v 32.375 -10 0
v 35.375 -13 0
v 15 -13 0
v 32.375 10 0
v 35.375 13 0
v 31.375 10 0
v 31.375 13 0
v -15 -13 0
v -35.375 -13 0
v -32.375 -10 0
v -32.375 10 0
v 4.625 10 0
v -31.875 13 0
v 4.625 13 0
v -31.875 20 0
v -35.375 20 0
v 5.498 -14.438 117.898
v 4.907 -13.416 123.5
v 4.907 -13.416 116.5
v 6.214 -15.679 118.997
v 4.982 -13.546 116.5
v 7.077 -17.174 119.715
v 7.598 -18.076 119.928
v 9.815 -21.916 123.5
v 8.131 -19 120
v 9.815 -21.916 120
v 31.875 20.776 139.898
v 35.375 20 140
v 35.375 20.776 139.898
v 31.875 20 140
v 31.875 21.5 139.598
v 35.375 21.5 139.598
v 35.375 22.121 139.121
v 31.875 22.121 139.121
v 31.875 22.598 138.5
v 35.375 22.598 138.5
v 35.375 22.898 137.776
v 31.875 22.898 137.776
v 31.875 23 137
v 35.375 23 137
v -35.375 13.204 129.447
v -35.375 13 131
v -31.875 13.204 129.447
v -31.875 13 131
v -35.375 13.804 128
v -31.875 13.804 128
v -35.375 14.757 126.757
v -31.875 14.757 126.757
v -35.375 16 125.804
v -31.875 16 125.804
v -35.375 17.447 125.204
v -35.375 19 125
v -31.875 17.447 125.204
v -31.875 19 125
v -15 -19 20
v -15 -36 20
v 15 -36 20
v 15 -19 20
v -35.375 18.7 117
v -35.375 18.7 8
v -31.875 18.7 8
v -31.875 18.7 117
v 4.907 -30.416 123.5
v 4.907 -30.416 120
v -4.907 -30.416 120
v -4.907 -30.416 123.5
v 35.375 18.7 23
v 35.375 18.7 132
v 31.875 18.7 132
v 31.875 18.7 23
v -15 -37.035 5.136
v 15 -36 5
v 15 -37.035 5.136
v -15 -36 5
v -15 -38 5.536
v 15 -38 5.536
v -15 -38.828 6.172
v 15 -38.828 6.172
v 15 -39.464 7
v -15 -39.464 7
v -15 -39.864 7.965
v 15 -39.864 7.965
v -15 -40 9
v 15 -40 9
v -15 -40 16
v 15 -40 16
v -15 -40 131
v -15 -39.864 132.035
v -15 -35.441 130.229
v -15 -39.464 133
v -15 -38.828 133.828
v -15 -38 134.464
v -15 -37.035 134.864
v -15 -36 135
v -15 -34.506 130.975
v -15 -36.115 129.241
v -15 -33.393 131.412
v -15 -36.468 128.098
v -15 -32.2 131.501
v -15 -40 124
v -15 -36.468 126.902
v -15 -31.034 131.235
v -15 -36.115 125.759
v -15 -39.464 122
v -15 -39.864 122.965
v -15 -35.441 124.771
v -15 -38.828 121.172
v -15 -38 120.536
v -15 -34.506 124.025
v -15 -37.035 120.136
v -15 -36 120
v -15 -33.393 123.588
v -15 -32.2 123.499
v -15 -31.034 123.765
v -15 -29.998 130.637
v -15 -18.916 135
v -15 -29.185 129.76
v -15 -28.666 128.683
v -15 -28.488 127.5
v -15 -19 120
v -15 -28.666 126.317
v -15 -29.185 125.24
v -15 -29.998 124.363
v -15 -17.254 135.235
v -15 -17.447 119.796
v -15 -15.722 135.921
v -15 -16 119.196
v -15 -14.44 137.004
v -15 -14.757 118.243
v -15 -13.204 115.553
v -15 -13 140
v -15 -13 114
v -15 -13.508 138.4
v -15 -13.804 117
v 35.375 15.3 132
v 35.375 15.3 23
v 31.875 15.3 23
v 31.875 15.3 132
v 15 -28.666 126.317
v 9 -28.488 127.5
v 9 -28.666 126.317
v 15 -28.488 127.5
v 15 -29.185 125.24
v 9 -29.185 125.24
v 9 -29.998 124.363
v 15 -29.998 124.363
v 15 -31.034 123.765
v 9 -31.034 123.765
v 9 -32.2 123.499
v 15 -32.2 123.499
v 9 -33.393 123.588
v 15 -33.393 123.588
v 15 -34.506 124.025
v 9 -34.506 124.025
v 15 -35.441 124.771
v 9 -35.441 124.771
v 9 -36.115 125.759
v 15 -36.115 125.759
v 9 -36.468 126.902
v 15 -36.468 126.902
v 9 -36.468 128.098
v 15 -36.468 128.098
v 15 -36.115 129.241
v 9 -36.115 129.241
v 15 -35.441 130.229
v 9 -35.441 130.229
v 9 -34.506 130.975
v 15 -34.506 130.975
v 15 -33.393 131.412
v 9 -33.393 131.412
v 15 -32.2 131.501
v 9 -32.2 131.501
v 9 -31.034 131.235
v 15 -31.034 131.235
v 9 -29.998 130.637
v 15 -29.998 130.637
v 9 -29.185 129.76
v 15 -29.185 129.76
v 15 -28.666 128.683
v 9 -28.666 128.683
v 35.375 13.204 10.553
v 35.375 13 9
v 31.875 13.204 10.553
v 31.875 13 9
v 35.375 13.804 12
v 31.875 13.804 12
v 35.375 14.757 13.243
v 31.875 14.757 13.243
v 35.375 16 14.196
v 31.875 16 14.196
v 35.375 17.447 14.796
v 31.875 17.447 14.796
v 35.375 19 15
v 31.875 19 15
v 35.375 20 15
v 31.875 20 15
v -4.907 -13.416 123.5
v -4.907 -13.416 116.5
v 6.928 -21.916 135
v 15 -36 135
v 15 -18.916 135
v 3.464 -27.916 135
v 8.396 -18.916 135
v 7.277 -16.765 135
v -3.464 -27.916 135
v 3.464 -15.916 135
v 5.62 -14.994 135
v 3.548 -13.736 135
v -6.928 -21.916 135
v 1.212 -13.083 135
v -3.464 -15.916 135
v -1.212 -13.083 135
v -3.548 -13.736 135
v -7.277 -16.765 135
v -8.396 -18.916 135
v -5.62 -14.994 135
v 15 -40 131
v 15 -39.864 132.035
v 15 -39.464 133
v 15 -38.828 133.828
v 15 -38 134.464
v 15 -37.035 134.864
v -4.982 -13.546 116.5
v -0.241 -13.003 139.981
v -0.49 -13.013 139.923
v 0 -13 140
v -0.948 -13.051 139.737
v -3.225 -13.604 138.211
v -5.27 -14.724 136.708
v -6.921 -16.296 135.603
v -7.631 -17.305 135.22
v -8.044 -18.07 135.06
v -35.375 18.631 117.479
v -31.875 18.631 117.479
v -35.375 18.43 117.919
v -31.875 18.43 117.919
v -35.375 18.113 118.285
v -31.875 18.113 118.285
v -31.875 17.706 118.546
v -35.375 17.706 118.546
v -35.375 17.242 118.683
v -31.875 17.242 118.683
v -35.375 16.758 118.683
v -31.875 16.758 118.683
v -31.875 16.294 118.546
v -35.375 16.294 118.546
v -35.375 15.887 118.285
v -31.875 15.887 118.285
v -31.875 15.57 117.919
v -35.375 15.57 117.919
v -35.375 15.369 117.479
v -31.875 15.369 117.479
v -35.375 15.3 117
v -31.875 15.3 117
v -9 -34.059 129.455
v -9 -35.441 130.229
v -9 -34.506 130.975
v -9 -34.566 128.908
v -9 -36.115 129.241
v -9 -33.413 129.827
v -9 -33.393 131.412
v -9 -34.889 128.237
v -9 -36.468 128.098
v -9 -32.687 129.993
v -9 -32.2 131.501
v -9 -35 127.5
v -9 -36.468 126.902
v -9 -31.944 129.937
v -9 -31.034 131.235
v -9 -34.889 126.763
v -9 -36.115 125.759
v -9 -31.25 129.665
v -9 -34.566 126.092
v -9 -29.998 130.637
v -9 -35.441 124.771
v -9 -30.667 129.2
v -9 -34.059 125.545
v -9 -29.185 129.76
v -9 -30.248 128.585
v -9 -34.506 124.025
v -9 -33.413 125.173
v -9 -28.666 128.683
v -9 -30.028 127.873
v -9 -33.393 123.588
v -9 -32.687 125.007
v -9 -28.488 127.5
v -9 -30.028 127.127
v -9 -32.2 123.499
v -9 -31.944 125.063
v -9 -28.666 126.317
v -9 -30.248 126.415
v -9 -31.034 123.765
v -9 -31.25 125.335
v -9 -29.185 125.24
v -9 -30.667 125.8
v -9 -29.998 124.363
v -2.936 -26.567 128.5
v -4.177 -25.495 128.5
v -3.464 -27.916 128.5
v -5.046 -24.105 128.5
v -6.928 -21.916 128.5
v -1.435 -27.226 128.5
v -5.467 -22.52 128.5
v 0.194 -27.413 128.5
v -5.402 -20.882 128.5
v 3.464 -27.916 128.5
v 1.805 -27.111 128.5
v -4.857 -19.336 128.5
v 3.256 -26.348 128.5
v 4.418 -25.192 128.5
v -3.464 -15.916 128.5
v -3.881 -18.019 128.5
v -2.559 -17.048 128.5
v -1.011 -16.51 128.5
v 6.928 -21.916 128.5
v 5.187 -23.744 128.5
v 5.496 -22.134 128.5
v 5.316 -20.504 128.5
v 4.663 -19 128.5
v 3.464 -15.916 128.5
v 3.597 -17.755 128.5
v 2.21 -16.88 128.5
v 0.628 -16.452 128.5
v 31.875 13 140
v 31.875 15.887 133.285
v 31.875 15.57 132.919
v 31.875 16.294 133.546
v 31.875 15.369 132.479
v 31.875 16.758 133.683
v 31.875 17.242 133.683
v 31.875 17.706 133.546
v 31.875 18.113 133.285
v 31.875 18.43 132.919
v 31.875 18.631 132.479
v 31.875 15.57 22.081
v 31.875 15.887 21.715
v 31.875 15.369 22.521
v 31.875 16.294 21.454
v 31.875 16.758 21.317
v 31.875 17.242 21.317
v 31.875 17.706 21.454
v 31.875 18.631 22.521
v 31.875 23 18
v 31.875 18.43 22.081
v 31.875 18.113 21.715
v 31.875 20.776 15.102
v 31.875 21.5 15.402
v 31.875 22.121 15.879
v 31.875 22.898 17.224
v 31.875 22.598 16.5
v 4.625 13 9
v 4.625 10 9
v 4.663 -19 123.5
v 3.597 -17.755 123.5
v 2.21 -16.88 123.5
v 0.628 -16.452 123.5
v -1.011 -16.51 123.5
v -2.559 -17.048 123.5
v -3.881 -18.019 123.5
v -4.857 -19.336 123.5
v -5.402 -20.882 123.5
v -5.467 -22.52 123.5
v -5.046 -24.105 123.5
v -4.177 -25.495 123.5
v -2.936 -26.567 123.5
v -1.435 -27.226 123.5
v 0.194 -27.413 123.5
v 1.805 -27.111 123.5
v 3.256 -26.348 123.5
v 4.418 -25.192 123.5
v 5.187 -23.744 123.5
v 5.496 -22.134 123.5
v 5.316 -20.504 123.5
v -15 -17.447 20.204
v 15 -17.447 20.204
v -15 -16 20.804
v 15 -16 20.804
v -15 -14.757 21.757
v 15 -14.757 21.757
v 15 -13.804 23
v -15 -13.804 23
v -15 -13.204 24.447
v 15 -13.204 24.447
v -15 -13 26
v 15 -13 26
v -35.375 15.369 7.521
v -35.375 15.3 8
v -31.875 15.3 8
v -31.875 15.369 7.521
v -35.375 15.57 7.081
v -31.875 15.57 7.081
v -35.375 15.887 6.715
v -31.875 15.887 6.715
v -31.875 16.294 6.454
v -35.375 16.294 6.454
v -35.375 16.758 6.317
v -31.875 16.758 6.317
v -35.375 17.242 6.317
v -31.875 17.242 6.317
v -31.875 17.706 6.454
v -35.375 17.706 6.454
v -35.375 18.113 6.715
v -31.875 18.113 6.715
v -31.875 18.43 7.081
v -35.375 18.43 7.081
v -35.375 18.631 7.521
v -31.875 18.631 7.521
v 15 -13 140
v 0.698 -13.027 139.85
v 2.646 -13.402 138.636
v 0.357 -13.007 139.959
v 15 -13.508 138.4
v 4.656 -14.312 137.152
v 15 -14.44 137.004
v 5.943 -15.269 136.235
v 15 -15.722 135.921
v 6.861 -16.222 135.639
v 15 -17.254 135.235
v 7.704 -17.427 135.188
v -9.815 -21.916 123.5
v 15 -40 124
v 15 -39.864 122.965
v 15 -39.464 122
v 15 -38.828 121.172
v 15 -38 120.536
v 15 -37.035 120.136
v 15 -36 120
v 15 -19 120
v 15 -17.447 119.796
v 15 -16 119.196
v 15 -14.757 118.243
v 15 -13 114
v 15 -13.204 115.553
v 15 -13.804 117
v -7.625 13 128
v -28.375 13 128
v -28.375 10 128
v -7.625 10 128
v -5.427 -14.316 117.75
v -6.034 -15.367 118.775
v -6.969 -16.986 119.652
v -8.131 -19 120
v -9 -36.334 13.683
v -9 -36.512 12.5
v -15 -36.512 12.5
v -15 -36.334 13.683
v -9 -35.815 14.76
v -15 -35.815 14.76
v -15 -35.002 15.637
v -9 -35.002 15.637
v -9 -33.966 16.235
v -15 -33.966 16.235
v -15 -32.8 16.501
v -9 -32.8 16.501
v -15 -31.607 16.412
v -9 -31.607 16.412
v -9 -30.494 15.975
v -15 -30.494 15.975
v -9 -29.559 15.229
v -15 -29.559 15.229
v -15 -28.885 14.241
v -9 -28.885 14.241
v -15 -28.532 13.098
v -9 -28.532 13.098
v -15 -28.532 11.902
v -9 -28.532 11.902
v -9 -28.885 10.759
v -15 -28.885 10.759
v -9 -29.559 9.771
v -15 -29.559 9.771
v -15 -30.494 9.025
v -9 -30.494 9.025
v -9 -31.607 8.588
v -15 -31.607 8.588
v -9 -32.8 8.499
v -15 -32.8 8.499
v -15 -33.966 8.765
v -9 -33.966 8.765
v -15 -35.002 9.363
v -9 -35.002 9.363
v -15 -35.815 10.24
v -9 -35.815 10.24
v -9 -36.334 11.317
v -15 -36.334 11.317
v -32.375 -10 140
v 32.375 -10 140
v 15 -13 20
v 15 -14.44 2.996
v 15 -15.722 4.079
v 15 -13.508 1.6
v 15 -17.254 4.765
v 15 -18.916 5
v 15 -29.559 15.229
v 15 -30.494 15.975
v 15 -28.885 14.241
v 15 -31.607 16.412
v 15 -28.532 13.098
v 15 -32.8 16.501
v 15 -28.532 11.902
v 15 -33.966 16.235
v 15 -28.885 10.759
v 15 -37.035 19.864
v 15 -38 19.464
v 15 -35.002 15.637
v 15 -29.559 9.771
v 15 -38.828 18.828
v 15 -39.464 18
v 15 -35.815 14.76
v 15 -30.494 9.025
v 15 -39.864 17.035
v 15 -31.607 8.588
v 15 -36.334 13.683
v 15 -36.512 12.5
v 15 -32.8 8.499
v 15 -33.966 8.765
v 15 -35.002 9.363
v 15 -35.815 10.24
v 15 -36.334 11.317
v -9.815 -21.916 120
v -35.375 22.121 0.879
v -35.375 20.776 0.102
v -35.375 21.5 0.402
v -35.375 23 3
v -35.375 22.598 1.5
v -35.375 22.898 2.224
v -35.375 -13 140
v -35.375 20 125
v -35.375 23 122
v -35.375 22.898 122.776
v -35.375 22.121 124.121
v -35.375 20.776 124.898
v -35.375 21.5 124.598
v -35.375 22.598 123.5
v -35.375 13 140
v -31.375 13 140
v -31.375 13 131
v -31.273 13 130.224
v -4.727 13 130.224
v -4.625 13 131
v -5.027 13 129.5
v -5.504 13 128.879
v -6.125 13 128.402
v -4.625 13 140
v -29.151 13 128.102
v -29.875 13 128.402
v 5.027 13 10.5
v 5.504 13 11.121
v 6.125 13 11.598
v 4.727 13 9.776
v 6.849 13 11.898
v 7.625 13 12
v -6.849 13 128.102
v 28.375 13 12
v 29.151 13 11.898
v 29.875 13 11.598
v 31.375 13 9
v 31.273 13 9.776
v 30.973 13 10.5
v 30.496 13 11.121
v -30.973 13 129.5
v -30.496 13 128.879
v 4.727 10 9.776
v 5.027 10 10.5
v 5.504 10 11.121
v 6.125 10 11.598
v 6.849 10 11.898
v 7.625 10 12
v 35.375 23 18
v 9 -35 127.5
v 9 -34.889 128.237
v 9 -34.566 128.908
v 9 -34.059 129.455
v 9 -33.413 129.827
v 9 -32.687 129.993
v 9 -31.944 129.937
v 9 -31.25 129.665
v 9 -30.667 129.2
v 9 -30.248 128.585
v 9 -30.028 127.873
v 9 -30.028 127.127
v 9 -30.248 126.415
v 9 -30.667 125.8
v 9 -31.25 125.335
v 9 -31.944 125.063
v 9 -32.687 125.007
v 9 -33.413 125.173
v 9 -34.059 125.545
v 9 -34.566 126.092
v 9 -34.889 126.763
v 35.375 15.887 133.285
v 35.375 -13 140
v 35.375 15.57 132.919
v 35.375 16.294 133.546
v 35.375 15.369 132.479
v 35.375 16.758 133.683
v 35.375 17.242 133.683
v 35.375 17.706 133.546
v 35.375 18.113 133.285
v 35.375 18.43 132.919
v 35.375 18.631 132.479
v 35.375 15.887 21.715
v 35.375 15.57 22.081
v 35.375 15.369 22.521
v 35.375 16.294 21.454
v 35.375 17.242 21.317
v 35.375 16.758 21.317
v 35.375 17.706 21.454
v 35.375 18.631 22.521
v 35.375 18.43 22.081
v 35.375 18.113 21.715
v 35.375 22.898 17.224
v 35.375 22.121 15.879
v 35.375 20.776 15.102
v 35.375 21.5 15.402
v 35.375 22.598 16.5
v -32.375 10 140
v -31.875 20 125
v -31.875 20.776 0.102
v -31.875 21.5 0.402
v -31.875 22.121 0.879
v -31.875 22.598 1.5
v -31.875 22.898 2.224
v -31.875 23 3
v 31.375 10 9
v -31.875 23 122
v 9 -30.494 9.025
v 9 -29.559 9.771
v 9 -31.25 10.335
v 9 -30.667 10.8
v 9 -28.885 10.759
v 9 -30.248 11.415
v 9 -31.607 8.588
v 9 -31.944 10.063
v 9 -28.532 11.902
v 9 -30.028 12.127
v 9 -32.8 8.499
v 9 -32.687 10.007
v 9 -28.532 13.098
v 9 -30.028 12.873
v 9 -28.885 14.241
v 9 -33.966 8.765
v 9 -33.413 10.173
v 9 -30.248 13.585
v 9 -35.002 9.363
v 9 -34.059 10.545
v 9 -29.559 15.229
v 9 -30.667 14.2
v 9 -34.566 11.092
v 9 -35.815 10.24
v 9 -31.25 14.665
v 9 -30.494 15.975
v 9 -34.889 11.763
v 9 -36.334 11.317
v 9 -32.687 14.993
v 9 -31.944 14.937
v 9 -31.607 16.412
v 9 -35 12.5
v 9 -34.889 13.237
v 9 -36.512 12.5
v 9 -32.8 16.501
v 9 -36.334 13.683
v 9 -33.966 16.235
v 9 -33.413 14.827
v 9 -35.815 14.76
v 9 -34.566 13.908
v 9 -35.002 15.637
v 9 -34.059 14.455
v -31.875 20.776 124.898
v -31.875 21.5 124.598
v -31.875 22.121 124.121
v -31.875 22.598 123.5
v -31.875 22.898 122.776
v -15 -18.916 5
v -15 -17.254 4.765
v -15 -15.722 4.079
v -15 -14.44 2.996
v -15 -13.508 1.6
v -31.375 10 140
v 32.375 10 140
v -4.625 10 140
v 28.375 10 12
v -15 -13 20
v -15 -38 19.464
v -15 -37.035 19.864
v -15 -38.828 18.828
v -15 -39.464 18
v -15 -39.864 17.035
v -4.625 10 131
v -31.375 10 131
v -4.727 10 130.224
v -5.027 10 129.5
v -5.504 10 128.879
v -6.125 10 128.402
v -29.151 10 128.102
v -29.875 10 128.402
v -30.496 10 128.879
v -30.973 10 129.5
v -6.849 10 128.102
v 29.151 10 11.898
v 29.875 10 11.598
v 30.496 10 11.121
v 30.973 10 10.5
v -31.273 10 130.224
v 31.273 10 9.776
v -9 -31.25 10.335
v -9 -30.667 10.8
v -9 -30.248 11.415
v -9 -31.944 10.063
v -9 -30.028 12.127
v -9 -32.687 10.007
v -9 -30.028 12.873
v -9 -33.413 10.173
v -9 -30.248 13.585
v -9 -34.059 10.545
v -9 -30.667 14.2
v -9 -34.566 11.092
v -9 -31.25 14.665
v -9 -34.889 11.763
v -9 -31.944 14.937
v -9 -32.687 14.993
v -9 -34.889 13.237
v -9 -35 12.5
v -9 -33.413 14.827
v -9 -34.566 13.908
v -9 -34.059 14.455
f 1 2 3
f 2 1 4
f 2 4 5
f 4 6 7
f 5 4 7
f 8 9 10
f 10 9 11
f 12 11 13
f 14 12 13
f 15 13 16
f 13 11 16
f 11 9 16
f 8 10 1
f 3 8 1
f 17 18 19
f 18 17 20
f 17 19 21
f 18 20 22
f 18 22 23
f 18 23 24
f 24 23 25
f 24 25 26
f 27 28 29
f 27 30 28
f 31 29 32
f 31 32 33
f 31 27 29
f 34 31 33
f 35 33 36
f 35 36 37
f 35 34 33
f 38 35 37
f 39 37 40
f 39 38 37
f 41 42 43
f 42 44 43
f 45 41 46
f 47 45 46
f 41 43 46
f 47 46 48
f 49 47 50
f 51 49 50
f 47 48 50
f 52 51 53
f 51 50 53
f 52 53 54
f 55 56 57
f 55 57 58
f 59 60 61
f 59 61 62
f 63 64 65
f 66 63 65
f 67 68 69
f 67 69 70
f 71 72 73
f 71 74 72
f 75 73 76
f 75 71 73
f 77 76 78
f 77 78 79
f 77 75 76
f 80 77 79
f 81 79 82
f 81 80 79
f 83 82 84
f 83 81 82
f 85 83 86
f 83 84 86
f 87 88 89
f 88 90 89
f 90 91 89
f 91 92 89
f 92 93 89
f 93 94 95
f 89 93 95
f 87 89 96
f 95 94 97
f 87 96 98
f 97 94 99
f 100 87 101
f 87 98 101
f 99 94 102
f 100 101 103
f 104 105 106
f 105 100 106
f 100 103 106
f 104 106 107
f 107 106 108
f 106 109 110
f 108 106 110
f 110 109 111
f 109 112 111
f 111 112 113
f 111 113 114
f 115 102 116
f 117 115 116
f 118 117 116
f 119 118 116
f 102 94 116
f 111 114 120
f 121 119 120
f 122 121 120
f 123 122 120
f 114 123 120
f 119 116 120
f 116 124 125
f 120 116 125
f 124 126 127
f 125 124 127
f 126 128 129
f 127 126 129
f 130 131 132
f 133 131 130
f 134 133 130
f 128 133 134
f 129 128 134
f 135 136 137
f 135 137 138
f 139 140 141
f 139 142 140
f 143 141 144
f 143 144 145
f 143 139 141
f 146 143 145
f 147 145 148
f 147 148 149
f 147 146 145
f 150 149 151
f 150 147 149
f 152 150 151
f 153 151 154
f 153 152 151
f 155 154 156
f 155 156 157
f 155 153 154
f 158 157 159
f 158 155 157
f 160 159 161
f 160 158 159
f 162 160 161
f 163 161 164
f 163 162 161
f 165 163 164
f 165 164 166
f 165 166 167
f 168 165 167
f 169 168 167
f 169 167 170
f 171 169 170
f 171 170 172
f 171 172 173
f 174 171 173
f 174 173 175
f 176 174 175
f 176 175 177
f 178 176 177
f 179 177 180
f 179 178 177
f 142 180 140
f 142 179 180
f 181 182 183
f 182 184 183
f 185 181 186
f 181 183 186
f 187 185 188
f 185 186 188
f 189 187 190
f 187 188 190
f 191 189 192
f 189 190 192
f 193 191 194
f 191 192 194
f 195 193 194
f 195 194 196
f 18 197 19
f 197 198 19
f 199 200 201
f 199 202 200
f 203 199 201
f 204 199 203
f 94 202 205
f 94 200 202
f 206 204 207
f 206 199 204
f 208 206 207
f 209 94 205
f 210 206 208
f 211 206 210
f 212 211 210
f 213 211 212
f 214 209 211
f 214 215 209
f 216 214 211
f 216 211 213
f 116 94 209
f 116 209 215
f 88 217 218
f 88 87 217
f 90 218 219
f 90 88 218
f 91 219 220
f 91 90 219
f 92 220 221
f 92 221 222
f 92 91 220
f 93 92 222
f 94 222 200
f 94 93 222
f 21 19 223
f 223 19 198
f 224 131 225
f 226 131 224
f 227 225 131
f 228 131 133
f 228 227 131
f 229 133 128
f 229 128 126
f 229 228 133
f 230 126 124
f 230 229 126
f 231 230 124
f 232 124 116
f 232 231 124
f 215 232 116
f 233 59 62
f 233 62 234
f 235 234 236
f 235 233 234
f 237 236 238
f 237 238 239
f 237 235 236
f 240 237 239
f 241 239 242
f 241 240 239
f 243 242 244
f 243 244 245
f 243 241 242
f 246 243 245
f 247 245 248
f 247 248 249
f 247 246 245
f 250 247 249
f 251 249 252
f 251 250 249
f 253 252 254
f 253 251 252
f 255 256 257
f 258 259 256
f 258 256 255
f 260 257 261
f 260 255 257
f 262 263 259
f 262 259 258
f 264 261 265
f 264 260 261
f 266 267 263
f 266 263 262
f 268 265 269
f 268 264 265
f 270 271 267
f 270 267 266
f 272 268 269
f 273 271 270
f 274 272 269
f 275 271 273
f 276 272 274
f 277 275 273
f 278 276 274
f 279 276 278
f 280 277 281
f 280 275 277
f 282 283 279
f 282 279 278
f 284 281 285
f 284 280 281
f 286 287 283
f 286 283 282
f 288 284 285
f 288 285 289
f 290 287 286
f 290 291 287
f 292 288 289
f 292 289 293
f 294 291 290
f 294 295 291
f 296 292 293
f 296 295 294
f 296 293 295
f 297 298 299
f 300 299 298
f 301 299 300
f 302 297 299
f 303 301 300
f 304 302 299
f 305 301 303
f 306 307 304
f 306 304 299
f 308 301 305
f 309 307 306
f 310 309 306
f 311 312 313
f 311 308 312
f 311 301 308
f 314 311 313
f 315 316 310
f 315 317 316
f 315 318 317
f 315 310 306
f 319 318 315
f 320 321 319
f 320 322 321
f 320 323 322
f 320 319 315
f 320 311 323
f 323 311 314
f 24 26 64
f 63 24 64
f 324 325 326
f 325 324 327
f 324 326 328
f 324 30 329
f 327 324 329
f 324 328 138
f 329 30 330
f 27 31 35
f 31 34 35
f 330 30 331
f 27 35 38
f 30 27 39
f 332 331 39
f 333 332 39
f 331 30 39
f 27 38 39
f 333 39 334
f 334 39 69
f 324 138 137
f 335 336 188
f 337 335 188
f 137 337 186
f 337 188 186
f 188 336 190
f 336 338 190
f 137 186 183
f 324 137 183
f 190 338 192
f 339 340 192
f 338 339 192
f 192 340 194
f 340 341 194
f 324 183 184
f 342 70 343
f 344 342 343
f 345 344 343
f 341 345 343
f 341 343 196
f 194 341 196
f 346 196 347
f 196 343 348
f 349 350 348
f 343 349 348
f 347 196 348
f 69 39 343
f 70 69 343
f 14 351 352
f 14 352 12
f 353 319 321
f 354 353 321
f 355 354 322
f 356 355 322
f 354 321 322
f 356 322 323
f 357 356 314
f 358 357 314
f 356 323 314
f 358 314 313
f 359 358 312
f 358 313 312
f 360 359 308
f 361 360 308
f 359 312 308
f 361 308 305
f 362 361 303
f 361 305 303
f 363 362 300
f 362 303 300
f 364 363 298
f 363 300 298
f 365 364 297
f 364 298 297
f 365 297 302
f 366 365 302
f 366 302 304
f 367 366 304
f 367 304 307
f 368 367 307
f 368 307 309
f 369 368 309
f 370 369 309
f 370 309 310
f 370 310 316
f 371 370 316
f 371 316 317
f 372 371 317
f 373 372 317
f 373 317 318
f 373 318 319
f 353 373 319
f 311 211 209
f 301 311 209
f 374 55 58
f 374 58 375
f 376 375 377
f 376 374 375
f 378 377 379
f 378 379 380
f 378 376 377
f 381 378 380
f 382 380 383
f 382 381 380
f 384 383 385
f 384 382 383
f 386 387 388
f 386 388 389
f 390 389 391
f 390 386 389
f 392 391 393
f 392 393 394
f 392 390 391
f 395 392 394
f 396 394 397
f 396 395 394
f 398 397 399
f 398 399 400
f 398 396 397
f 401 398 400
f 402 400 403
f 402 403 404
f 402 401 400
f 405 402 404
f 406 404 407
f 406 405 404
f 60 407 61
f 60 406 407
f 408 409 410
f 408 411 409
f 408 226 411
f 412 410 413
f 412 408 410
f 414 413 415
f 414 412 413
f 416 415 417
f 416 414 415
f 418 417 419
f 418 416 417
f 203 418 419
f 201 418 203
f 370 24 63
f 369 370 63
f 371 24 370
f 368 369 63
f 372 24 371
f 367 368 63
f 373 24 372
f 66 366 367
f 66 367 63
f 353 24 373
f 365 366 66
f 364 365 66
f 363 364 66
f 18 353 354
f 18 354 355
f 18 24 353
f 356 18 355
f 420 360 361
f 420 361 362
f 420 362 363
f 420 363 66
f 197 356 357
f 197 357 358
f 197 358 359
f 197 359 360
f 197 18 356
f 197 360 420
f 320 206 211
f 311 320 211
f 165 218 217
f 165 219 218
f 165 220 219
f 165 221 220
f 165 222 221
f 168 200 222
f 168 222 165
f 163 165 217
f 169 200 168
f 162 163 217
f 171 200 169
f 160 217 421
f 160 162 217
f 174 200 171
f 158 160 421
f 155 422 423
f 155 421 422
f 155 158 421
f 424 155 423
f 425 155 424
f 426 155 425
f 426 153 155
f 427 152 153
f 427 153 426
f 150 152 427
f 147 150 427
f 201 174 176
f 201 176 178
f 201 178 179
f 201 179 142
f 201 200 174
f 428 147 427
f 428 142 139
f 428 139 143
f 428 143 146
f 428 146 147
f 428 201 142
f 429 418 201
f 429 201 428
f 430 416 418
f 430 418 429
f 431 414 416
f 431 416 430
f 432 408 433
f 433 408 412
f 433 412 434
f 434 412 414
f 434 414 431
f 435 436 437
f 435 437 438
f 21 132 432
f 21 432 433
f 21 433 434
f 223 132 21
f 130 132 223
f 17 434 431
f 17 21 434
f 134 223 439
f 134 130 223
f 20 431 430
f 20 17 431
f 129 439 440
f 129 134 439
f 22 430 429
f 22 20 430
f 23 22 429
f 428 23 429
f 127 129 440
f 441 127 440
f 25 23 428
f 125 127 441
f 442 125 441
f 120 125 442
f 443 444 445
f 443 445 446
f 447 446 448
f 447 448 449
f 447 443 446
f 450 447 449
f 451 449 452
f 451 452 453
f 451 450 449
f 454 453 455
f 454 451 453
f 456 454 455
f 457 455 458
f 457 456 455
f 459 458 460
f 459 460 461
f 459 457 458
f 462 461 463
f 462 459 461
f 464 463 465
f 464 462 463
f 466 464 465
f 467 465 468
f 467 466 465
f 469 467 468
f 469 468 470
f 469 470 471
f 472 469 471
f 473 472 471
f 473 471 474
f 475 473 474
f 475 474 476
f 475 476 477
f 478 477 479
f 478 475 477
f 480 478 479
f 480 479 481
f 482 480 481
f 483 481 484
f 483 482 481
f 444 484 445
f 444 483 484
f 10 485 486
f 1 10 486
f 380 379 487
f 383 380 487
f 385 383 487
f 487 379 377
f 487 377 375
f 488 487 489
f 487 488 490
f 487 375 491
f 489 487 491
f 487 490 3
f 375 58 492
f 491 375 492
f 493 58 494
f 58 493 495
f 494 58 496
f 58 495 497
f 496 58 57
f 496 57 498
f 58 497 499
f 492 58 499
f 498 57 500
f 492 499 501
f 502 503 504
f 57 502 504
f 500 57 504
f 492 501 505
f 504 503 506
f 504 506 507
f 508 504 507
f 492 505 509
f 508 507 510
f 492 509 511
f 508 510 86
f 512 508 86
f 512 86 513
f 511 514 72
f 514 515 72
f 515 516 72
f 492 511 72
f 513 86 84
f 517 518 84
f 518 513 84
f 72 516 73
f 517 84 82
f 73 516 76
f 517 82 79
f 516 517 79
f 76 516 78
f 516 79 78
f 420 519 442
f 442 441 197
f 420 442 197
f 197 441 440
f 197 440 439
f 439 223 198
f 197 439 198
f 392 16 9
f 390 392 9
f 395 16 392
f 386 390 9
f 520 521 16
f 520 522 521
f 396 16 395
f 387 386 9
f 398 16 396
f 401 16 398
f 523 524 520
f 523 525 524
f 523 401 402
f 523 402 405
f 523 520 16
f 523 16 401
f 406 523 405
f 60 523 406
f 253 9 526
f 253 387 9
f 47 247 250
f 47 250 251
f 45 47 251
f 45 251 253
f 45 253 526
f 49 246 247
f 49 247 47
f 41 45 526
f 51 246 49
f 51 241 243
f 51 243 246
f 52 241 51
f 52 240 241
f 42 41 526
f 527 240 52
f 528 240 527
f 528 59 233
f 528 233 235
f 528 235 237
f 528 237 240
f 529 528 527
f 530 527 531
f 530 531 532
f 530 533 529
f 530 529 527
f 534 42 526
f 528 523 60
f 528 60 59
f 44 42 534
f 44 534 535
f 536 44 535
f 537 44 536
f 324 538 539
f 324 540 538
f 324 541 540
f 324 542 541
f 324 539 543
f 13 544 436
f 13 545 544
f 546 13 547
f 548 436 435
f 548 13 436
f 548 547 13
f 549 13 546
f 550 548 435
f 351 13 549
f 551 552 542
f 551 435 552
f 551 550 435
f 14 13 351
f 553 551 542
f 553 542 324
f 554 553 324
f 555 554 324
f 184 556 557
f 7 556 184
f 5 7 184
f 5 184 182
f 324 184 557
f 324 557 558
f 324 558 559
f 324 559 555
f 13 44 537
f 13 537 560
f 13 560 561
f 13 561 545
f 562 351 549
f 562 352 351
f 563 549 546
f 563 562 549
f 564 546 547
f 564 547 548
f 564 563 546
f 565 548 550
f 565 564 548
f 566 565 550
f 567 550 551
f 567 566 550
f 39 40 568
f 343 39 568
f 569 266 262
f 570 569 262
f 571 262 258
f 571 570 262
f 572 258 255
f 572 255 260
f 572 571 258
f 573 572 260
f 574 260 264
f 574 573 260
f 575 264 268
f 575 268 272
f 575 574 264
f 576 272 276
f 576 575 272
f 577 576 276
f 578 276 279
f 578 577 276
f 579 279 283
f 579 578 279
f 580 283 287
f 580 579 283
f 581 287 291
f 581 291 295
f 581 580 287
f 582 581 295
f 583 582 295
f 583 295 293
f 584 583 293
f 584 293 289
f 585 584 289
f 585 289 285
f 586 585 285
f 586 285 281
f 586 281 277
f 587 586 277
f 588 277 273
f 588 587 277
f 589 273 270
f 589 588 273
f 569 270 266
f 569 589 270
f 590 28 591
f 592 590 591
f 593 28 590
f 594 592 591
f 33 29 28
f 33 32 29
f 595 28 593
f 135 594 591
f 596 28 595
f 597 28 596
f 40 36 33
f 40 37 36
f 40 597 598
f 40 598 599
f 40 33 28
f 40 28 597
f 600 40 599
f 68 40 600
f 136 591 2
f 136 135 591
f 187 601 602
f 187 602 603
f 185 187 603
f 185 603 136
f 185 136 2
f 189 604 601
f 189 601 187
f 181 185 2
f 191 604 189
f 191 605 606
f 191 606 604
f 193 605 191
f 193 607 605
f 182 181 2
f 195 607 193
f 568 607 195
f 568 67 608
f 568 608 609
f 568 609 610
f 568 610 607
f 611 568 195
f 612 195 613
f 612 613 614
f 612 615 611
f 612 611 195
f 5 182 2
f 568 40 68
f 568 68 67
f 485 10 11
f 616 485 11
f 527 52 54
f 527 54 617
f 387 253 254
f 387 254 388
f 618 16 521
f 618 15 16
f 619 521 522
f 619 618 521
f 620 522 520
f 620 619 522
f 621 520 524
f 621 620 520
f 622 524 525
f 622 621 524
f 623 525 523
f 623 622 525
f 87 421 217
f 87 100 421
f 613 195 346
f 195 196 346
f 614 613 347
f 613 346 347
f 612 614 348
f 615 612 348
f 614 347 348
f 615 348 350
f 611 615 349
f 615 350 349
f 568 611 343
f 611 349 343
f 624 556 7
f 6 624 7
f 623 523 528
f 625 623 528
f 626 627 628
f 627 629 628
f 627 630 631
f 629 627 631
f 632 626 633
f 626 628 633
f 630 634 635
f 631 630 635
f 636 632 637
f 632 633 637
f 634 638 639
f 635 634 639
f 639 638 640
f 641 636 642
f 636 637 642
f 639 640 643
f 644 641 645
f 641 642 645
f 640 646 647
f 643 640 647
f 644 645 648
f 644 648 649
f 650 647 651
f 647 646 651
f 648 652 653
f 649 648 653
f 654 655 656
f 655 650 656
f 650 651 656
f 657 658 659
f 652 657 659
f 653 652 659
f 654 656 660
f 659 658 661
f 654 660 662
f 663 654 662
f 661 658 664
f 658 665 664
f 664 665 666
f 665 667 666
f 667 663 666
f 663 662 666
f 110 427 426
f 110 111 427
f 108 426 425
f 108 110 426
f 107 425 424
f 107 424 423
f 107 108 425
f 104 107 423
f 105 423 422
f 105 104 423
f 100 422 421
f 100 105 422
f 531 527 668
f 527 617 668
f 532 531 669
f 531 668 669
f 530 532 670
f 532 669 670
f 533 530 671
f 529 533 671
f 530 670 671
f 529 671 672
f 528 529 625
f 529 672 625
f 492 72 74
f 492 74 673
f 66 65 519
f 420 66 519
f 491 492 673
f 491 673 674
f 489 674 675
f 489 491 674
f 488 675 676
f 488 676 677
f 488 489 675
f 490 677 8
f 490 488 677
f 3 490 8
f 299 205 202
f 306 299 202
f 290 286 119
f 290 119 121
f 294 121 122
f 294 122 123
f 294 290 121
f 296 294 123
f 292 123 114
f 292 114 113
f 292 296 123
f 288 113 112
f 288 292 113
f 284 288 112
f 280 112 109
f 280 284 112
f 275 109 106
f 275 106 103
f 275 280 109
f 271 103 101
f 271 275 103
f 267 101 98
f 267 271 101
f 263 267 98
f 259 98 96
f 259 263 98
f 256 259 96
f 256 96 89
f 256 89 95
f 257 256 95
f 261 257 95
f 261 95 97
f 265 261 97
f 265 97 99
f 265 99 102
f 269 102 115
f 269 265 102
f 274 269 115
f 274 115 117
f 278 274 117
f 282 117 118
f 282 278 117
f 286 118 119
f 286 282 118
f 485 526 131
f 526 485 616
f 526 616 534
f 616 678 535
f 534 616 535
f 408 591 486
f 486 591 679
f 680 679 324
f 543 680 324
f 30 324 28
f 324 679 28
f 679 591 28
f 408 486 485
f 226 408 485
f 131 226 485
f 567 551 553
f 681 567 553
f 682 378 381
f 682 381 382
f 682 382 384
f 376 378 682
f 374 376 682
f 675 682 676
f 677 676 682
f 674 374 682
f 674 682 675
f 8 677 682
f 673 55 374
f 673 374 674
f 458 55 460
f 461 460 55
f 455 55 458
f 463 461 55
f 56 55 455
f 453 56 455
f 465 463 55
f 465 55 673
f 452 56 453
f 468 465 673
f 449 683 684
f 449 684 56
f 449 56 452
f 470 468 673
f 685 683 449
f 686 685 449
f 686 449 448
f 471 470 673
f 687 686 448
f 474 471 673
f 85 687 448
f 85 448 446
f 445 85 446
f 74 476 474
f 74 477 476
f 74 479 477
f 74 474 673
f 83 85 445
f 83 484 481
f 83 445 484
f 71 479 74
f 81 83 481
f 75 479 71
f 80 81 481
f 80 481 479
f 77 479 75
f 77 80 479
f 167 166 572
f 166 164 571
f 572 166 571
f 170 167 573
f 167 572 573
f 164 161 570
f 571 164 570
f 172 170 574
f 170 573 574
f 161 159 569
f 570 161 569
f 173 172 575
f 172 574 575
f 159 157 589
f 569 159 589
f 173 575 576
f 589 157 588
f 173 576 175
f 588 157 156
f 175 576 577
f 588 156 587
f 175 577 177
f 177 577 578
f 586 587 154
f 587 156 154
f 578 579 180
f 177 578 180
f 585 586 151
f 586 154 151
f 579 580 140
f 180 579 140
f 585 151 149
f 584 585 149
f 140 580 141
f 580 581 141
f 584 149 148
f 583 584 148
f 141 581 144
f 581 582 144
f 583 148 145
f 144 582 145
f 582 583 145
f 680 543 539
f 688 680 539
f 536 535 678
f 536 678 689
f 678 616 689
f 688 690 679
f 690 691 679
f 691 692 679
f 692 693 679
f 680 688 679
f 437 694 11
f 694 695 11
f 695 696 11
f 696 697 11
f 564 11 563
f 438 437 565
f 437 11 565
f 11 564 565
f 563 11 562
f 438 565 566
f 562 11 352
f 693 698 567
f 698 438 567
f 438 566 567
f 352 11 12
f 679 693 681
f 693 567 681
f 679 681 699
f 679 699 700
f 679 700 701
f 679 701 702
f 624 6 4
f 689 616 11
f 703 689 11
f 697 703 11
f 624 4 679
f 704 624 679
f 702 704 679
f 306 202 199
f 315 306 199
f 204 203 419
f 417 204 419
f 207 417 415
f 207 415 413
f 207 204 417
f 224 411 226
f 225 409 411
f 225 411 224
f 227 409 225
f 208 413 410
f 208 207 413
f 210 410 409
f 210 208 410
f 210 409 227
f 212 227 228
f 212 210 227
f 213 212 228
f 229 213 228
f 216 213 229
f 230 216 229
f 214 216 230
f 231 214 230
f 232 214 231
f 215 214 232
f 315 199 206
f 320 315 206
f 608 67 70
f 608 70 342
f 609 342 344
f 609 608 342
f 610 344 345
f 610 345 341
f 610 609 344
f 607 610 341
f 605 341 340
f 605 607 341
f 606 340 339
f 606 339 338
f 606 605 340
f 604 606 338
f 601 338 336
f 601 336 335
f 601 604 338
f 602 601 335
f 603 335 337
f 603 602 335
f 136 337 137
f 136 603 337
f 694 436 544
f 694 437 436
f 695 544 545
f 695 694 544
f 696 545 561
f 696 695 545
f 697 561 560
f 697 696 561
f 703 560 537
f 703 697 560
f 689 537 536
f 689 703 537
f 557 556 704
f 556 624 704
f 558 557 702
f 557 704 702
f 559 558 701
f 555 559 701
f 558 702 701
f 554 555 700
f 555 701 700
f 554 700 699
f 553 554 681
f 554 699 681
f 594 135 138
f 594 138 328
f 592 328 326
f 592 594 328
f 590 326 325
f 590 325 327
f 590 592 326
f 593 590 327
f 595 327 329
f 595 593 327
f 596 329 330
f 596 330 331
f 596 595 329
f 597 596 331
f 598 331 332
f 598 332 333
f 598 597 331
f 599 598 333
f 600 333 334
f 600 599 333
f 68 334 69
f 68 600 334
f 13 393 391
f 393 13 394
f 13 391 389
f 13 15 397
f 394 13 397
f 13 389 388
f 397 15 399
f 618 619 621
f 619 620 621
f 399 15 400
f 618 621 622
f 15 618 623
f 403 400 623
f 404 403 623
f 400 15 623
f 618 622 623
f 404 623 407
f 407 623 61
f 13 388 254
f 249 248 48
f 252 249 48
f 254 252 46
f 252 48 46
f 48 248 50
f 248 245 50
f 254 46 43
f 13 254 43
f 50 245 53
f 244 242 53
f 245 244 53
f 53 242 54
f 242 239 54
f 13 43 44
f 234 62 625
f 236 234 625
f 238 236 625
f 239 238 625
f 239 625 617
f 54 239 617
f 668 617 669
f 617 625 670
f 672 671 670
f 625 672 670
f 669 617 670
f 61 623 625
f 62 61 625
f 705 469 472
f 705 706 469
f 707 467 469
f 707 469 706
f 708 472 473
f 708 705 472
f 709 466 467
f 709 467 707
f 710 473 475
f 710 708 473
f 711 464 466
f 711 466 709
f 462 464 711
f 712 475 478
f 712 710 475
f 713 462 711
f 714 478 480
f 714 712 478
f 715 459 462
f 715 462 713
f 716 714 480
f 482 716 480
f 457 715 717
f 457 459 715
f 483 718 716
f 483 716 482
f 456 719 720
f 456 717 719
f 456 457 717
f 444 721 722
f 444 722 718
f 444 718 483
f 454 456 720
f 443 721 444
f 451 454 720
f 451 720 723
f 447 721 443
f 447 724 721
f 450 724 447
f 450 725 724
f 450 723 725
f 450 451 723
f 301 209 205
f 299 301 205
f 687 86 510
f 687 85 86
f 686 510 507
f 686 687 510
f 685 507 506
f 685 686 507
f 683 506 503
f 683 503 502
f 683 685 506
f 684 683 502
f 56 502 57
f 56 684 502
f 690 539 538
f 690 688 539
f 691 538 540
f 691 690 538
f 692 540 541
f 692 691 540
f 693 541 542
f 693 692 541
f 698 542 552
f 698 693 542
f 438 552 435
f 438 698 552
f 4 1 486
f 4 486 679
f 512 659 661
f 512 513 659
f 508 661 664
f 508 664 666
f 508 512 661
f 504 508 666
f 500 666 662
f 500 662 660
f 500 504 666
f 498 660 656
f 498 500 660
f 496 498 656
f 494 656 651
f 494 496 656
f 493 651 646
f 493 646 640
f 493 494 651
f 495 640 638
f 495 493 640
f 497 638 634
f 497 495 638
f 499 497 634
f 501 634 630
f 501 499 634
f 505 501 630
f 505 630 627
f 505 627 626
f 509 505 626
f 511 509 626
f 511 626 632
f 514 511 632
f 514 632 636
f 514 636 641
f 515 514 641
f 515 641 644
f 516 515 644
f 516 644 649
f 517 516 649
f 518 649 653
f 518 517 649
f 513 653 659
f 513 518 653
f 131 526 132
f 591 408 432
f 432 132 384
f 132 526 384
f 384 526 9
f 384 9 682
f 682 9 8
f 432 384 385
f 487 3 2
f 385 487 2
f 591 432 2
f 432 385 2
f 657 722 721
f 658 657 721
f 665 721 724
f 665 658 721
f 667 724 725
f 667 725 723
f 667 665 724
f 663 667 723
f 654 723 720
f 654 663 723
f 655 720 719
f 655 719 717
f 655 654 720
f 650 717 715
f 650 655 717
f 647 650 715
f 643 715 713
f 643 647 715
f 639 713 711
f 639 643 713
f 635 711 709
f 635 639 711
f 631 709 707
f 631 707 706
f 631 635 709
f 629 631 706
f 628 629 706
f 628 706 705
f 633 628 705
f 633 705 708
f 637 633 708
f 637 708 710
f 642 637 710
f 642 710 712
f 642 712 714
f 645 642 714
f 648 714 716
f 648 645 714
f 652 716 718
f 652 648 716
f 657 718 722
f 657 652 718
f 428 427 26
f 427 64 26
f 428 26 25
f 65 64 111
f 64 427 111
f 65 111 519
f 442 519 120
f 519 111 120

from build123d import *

# Parameters (mm, degrees)
SKETCH1_W            = 64.75
SKETCH1_H            = 20
BODY_DEPTH           = 140
SHELL1_T             = 3
SWITCH_CUTOUT_REACH  = 148.722
SKETCH2_W            = 26.75
SKETCH2_H            = 12
SKETCH4_W            = 15
SKETCH4_H            = 27
SKETCH4_R            = 4.0125
AXLE_HOLDER_DEPTH    = 15
SKETCH5_R            = 4.0125
SKETCH5_R_2          = 2.5
BUSHING_HOLDER_DEPTH = 9
FILLET3_R            = 4
FILLET4_R            = 6
SKETCH6_W            = 125
SKETCH6_H            = 10
SLIDE_MOUNT_DEPTH    = 3.5
CIRPATTERN1_COUNT    = 2
FILLET6_R            = 3
FILLET7_R            = 3
FILLET8_R            = 6
CUT_EXTRUDE1_REACH   = 147.177
SKETCH7_R            = 5.5
SKETCH8_R            = 8.916079783
CUT_EXTRUDE2_DEPTH   = 9
CUT_EXTRUDE3_DEPTH   = 3.5
CUT_EXTRUDE4_DEPTH   = 6.5


with BuildPart() as part:
    # Sketch1 → Body (new body)
    with BuildSketch(Plane.XY):
        Rectangle(SKETCH1_W, SKETCH1_H)
    extrude(amount=BODY_DEPTH)

    # Shell1
    shell1_openings = [part.faces().sort_by_distance(p)[0] for p in [
        (0, 0, 0),
        (0, 0, 140),
    ]]
    offset(amount=SHELL1_T, openings=shell1_openings, kind=Kind.INTERSECTION)

    # Sketch2 → Switch_cutout (cut, up to next)
    with BuildSketch(Plane(origin=(0, 13, 0), x_dir=(1, 0, 0), z_dir=(0, 1, 0)), mode=Mode.PRIVATE) as switch_cutout_sk1:
        with Locations((18, -6)):
            Rectangle(SKETCH2_W, SKETCH2_H)
    switch_cutout_tool1 = extrude(switch_cutout_sk1.sketch, amount=-SWITCH_CUTOUT_REACH, mode=Mode.PRIVATE) & part.part
    # Sketch2 → Switch_cutout (cut, up to next)
    with BuildSketch(Plane(origin=(0, 13, 0), x_dir=(1, 0, 0), z_dir=(0, 1, 0)), mode=Mode.PRIVATE) as switch_cutout_sk2:
        with Locations((-18, -134)):
            Rectangle(SKETCH2_W, SKETCH2_H)
    switch_cutout_tool2 = extrude(switch_cutout_sk2.sketch, amount=-SWITCH_CUTOUT_REACH, mode=Mode.PRIVATE) & part.part
    add(switch_cutout_tool1.solids().sort_by_distance((18, 13, 6))[0], mode=Mode.SUBTRACT)
    add(switch_cutout_tool2.solids().sort_by_distance((-18, 13, 134))[0], mode=Mode.SUBTRACT)

    # Sketch4 → Axle_holder (add, symmetric)
    # profile 1 of 2: a face of its own
    with BuildSketch(Plane.ZY):
        with Locations((12.5, -26.5)):
            Rectangle(SKETCH4_W, SKETCH4_H)
        with Locations(Location((12.5, -32.5, 0), (0, 0, 270))):
            Circle(SKETCH4_R, mode=Mode.SUBTRACT)
    # profile 2 of 2: a face of its own
    with BuildSketch(Plane.ZY):
        with Locations((127.5, -26.5)):
            Rectangle(SKETCH4_W, SKETCH4_H)
        with Locations(Location((127.5, -32.5, 0), (0, 0, 90))):
            Circle(SKETCH4_R, mode=Mode.SUBTRACT)
    extrude(amount=AXLE_HOLDER_DEPTH, both=True)

    # Sketch5 → Bushing_holder (add, symmetric)
    # profile 1 of 2: a face of its own
    with BuildSketch(Plane.ZY):
        with Locations(Location((12.5, -32.5, 0), (0, 0, 270))):
            Circle(SKETCH5_R)
        with Locations(Location((12.5, -32.5, 0), (0, 0, 270))):
            Circle(SKETCH5_R_2, mode=Mode.SUBTRACT)
    # profile 2 of 2: a face of its own
    with BuildSketch(Plane.ZY):
        with Locations(Location((127.5, -32.5, 0), (0, 0, 90))):
            Circle(SKETCH5_R)
        with Locations(Location((127.5, -32.5, 0), (0, 0, 270))):
            Circle(SKETCH5_R_2, mode=Mode.SUBTRACT)
    extrude(amount=BUSHING_HOLDER_DEPTH, both=True)

    # Fillet3
    fillet3_edges = [part.edges().sort_by_distance(p)[0] for p in [
        (0, -40, 5),
        (0, -40, 20),
        (0, -40, 135),
        (0, -40, 120),
    ]]
    fillet(fillet3_edges, radius=FILLET3_R)

    # Fillet4
    # the kernel refuses this fillet: 6 mm, written as the material it adds along each edge
    with BuildSketch(Plane(origin=(15, -13, 5), x_dir=(0, 0, -1), z_dir=(-1, 0, 0))) as fillet4_piece_1:
        with BuildLine():
            CenterArc((6, 5.916079783), FILLET4_R, 180, 80.405931773)
            Line((0, 5.916079783), (-0.12, 5.916079783))
            Line((-0.12, 5.916079783), (-0.12, 0))
            Line((-0.12, 0), (0, -0.12))
            ThreePointArc((0, -0.12), (2.5, -0.12), (4.98, -0.118321596))
            Line((4.98, -0.118321596), (5, 0))
        make_face()
    extrude(amount=30)
    with BuildSketch(Plane(origin=(-15, -13, 20), x_dir=(0, 0, 1), z_dir=(1, 0, 0)), Plane(origin=(-15, -13, 120), x_dir=(0, -1, 0), z_dir=(1, 0, 0))) as fillet4_piece_2:
        with BuildLine():
            CenterArc((FILLET4_R, FILLET4_R), FILLET4_R, 180, 90)
            Line((0, FILLET4_R), (-FILLET4_R * 0.02, FILLET4_R))
            Line((-FILLET4_R * 0.02, FILLET4_R), (-FILLET4_R * 0.02, -FILLET4_R * 0.02))
            Line((-FILLET4_R * 0.02, -FILLET4_R * 0.02), (FILLET4_R, -FILLET4_R * 0.02))
            Line((FILLET4_R, -FILLET4_R * 0.02), (FILLET4_R, 0))
        make_face()
    extrude(amount=30)
    with BuildSketch(Plane(origin=(15, -13, 135), x_dir=(0, 0, 1), z_dir=(-1, 0, 0))) as fillet4_piece_3:
        with BuildLine():
            CenterArc((6, -5.916079783), FILLET4_R, 99.594068227, 80.405931773)
            Line((0, -5.916079783), (-0.12, -5.916079783))
            Line((-0.12, -5.916079783), (-0.12, 0))
            Line((-0.12, 0), (0, 0.12))
            ThreePointArc((0, 0.12), (2.5, 0.12), (4.98, 0.118321596))
            Line((4.98, 0.118321596), (5, 0))
        make_face()
    extrude(amount=30)

    # Sketch6 → Slide_mount (add)
    with BuildSketch(Plane(origin=(35.375, 0, 0), x_dir=(0, 0, -1), z_dir=(1, 0, 0))):
        with Locations((-77.5, 18)):
            Rectangle(SKETCH6_W, SKETCH6_H)
        with BuildLine():
            Line((-132, 18.7), (-23, 18.7))
            ThreePointArc((-23, 18.7), (-21.3, 17), (-23, 15.3))
            Line((-23, 15.3), (-132, 15.3))
            ThreePointArc((-132, 15.3), (-133.7, 17), (-132, 18.7))
        make_face(mode=Mode.SUBTRACT)
    slide_mount = extrude(amount=-SLIDE_MOUNT_DEPTH)

    # CirPattern1: Slide_mount ×2 about axis
    cirpattern1_axis = Axis((0, 0, 70), (0, 1, 0))
    for i in range(1, CIRPATTERN1_COUNT):
        add(slide_mount.rotate(cirpattern1_axis, i * 360 / CIRPATTERN1_COUNT))

    # Fillet6
    fillet6_edges = [part.edges().sort_by_distance(p)[0] for p in [
        (33.625, 23, 140),
        (33.625, 23, 15),
        (-33.625, 23, 0),
        (-33.625, 23, 125),
    ]]
    fillet(fillet6_edges, radius=FILLET6_R)

    # Fillet7
    fillet7_edges = [part.edges().sort_by_distance(p)[0] for p in [
        (4.625, 11.5, 12),
        (31.375, 11.5, 12),
        (-31.375, 11.5, 128),
        (-4.625, 11.5, 128),
    ]]
    fillet(fillet7_edges, radius=FILLET7_R)

    # Fillet8
    fillet8_edges = [part.edges().sort_by_distance(p)[0] for p in [
        (33.625, 13, 15),
        (-33.625, 13, 125),
    ]]
    fillet(fillet8_edges, radius=FILLET8_R)

    # Sketch7 → Cut-Extrude1 (cut, up to next)
    with BuildSketch(Plane.XY.offset(135), mode=Mode.PRIVATE) as cut_extrude1_sk1:
        with Locations(Location((0, -21.916079783, 0), (0, 0, 32.018720622))):
            Circle(SKETCH7_R)
    cut_extrude1_tool1 = extrude(cut_extrude1_sk1.sketch, amount=-CUT_EXTRUDE1_REACH, mode=Mode.PRIVATE) & part.part
    add(cut_extrude1_tool1.solids().sort_by_distance((0, -21.91608, 135))[0], mode=Mode.SUBTRACT)

    # Sketch8 → Cut-Extrude2 (cut)
    with BuildSketch(Plane.XY.offset(135)):
        with Locations((0, -21.916079783)):
            Circle(SKETCH8_R)
    extrude(amount=CUT_EXTRUDE2_DEPTH, mode=Mode.SUBTRACT)

    # Sketch9 → Cut-Extrude3 (cut, symmetric)
    with BuildSketch(Plane(origin=(0, 0, 120), x_dir=(-1, 0, 0), z_dir=(0, 0, -1))):
        Polygon((-9.814954576, -21.916079783), (-4.907477288, -30.416079783), (4.907477288, -30.416079783), (9.814954576, -21.916079783), (4.907477288, -13.416079783), (-4.907477288, -13.416079783), align=None)
    extrude(amount=CUT_EXTRUDE3_DEPTH, both=True, mode=Mode.SUBTRACT)

    # Sketch10 → Cut-Extrude4 (cut)
    with BuildSketch(Plane.XY.offset(135)):
        Polygon((3.464101615, -15.916079783), (-3.464101615, -15.916079783), (-6.92820323, -21.916079783), (-3.464101615, -27.916079783), (3.464101615, -27.916079783), (6.92820323, -21.916079783), align=None)
    extrude(amount=-CUT_EXTRUDE4_DEPTH, mode=Mode.SUBTRACT)


solid = part.part
